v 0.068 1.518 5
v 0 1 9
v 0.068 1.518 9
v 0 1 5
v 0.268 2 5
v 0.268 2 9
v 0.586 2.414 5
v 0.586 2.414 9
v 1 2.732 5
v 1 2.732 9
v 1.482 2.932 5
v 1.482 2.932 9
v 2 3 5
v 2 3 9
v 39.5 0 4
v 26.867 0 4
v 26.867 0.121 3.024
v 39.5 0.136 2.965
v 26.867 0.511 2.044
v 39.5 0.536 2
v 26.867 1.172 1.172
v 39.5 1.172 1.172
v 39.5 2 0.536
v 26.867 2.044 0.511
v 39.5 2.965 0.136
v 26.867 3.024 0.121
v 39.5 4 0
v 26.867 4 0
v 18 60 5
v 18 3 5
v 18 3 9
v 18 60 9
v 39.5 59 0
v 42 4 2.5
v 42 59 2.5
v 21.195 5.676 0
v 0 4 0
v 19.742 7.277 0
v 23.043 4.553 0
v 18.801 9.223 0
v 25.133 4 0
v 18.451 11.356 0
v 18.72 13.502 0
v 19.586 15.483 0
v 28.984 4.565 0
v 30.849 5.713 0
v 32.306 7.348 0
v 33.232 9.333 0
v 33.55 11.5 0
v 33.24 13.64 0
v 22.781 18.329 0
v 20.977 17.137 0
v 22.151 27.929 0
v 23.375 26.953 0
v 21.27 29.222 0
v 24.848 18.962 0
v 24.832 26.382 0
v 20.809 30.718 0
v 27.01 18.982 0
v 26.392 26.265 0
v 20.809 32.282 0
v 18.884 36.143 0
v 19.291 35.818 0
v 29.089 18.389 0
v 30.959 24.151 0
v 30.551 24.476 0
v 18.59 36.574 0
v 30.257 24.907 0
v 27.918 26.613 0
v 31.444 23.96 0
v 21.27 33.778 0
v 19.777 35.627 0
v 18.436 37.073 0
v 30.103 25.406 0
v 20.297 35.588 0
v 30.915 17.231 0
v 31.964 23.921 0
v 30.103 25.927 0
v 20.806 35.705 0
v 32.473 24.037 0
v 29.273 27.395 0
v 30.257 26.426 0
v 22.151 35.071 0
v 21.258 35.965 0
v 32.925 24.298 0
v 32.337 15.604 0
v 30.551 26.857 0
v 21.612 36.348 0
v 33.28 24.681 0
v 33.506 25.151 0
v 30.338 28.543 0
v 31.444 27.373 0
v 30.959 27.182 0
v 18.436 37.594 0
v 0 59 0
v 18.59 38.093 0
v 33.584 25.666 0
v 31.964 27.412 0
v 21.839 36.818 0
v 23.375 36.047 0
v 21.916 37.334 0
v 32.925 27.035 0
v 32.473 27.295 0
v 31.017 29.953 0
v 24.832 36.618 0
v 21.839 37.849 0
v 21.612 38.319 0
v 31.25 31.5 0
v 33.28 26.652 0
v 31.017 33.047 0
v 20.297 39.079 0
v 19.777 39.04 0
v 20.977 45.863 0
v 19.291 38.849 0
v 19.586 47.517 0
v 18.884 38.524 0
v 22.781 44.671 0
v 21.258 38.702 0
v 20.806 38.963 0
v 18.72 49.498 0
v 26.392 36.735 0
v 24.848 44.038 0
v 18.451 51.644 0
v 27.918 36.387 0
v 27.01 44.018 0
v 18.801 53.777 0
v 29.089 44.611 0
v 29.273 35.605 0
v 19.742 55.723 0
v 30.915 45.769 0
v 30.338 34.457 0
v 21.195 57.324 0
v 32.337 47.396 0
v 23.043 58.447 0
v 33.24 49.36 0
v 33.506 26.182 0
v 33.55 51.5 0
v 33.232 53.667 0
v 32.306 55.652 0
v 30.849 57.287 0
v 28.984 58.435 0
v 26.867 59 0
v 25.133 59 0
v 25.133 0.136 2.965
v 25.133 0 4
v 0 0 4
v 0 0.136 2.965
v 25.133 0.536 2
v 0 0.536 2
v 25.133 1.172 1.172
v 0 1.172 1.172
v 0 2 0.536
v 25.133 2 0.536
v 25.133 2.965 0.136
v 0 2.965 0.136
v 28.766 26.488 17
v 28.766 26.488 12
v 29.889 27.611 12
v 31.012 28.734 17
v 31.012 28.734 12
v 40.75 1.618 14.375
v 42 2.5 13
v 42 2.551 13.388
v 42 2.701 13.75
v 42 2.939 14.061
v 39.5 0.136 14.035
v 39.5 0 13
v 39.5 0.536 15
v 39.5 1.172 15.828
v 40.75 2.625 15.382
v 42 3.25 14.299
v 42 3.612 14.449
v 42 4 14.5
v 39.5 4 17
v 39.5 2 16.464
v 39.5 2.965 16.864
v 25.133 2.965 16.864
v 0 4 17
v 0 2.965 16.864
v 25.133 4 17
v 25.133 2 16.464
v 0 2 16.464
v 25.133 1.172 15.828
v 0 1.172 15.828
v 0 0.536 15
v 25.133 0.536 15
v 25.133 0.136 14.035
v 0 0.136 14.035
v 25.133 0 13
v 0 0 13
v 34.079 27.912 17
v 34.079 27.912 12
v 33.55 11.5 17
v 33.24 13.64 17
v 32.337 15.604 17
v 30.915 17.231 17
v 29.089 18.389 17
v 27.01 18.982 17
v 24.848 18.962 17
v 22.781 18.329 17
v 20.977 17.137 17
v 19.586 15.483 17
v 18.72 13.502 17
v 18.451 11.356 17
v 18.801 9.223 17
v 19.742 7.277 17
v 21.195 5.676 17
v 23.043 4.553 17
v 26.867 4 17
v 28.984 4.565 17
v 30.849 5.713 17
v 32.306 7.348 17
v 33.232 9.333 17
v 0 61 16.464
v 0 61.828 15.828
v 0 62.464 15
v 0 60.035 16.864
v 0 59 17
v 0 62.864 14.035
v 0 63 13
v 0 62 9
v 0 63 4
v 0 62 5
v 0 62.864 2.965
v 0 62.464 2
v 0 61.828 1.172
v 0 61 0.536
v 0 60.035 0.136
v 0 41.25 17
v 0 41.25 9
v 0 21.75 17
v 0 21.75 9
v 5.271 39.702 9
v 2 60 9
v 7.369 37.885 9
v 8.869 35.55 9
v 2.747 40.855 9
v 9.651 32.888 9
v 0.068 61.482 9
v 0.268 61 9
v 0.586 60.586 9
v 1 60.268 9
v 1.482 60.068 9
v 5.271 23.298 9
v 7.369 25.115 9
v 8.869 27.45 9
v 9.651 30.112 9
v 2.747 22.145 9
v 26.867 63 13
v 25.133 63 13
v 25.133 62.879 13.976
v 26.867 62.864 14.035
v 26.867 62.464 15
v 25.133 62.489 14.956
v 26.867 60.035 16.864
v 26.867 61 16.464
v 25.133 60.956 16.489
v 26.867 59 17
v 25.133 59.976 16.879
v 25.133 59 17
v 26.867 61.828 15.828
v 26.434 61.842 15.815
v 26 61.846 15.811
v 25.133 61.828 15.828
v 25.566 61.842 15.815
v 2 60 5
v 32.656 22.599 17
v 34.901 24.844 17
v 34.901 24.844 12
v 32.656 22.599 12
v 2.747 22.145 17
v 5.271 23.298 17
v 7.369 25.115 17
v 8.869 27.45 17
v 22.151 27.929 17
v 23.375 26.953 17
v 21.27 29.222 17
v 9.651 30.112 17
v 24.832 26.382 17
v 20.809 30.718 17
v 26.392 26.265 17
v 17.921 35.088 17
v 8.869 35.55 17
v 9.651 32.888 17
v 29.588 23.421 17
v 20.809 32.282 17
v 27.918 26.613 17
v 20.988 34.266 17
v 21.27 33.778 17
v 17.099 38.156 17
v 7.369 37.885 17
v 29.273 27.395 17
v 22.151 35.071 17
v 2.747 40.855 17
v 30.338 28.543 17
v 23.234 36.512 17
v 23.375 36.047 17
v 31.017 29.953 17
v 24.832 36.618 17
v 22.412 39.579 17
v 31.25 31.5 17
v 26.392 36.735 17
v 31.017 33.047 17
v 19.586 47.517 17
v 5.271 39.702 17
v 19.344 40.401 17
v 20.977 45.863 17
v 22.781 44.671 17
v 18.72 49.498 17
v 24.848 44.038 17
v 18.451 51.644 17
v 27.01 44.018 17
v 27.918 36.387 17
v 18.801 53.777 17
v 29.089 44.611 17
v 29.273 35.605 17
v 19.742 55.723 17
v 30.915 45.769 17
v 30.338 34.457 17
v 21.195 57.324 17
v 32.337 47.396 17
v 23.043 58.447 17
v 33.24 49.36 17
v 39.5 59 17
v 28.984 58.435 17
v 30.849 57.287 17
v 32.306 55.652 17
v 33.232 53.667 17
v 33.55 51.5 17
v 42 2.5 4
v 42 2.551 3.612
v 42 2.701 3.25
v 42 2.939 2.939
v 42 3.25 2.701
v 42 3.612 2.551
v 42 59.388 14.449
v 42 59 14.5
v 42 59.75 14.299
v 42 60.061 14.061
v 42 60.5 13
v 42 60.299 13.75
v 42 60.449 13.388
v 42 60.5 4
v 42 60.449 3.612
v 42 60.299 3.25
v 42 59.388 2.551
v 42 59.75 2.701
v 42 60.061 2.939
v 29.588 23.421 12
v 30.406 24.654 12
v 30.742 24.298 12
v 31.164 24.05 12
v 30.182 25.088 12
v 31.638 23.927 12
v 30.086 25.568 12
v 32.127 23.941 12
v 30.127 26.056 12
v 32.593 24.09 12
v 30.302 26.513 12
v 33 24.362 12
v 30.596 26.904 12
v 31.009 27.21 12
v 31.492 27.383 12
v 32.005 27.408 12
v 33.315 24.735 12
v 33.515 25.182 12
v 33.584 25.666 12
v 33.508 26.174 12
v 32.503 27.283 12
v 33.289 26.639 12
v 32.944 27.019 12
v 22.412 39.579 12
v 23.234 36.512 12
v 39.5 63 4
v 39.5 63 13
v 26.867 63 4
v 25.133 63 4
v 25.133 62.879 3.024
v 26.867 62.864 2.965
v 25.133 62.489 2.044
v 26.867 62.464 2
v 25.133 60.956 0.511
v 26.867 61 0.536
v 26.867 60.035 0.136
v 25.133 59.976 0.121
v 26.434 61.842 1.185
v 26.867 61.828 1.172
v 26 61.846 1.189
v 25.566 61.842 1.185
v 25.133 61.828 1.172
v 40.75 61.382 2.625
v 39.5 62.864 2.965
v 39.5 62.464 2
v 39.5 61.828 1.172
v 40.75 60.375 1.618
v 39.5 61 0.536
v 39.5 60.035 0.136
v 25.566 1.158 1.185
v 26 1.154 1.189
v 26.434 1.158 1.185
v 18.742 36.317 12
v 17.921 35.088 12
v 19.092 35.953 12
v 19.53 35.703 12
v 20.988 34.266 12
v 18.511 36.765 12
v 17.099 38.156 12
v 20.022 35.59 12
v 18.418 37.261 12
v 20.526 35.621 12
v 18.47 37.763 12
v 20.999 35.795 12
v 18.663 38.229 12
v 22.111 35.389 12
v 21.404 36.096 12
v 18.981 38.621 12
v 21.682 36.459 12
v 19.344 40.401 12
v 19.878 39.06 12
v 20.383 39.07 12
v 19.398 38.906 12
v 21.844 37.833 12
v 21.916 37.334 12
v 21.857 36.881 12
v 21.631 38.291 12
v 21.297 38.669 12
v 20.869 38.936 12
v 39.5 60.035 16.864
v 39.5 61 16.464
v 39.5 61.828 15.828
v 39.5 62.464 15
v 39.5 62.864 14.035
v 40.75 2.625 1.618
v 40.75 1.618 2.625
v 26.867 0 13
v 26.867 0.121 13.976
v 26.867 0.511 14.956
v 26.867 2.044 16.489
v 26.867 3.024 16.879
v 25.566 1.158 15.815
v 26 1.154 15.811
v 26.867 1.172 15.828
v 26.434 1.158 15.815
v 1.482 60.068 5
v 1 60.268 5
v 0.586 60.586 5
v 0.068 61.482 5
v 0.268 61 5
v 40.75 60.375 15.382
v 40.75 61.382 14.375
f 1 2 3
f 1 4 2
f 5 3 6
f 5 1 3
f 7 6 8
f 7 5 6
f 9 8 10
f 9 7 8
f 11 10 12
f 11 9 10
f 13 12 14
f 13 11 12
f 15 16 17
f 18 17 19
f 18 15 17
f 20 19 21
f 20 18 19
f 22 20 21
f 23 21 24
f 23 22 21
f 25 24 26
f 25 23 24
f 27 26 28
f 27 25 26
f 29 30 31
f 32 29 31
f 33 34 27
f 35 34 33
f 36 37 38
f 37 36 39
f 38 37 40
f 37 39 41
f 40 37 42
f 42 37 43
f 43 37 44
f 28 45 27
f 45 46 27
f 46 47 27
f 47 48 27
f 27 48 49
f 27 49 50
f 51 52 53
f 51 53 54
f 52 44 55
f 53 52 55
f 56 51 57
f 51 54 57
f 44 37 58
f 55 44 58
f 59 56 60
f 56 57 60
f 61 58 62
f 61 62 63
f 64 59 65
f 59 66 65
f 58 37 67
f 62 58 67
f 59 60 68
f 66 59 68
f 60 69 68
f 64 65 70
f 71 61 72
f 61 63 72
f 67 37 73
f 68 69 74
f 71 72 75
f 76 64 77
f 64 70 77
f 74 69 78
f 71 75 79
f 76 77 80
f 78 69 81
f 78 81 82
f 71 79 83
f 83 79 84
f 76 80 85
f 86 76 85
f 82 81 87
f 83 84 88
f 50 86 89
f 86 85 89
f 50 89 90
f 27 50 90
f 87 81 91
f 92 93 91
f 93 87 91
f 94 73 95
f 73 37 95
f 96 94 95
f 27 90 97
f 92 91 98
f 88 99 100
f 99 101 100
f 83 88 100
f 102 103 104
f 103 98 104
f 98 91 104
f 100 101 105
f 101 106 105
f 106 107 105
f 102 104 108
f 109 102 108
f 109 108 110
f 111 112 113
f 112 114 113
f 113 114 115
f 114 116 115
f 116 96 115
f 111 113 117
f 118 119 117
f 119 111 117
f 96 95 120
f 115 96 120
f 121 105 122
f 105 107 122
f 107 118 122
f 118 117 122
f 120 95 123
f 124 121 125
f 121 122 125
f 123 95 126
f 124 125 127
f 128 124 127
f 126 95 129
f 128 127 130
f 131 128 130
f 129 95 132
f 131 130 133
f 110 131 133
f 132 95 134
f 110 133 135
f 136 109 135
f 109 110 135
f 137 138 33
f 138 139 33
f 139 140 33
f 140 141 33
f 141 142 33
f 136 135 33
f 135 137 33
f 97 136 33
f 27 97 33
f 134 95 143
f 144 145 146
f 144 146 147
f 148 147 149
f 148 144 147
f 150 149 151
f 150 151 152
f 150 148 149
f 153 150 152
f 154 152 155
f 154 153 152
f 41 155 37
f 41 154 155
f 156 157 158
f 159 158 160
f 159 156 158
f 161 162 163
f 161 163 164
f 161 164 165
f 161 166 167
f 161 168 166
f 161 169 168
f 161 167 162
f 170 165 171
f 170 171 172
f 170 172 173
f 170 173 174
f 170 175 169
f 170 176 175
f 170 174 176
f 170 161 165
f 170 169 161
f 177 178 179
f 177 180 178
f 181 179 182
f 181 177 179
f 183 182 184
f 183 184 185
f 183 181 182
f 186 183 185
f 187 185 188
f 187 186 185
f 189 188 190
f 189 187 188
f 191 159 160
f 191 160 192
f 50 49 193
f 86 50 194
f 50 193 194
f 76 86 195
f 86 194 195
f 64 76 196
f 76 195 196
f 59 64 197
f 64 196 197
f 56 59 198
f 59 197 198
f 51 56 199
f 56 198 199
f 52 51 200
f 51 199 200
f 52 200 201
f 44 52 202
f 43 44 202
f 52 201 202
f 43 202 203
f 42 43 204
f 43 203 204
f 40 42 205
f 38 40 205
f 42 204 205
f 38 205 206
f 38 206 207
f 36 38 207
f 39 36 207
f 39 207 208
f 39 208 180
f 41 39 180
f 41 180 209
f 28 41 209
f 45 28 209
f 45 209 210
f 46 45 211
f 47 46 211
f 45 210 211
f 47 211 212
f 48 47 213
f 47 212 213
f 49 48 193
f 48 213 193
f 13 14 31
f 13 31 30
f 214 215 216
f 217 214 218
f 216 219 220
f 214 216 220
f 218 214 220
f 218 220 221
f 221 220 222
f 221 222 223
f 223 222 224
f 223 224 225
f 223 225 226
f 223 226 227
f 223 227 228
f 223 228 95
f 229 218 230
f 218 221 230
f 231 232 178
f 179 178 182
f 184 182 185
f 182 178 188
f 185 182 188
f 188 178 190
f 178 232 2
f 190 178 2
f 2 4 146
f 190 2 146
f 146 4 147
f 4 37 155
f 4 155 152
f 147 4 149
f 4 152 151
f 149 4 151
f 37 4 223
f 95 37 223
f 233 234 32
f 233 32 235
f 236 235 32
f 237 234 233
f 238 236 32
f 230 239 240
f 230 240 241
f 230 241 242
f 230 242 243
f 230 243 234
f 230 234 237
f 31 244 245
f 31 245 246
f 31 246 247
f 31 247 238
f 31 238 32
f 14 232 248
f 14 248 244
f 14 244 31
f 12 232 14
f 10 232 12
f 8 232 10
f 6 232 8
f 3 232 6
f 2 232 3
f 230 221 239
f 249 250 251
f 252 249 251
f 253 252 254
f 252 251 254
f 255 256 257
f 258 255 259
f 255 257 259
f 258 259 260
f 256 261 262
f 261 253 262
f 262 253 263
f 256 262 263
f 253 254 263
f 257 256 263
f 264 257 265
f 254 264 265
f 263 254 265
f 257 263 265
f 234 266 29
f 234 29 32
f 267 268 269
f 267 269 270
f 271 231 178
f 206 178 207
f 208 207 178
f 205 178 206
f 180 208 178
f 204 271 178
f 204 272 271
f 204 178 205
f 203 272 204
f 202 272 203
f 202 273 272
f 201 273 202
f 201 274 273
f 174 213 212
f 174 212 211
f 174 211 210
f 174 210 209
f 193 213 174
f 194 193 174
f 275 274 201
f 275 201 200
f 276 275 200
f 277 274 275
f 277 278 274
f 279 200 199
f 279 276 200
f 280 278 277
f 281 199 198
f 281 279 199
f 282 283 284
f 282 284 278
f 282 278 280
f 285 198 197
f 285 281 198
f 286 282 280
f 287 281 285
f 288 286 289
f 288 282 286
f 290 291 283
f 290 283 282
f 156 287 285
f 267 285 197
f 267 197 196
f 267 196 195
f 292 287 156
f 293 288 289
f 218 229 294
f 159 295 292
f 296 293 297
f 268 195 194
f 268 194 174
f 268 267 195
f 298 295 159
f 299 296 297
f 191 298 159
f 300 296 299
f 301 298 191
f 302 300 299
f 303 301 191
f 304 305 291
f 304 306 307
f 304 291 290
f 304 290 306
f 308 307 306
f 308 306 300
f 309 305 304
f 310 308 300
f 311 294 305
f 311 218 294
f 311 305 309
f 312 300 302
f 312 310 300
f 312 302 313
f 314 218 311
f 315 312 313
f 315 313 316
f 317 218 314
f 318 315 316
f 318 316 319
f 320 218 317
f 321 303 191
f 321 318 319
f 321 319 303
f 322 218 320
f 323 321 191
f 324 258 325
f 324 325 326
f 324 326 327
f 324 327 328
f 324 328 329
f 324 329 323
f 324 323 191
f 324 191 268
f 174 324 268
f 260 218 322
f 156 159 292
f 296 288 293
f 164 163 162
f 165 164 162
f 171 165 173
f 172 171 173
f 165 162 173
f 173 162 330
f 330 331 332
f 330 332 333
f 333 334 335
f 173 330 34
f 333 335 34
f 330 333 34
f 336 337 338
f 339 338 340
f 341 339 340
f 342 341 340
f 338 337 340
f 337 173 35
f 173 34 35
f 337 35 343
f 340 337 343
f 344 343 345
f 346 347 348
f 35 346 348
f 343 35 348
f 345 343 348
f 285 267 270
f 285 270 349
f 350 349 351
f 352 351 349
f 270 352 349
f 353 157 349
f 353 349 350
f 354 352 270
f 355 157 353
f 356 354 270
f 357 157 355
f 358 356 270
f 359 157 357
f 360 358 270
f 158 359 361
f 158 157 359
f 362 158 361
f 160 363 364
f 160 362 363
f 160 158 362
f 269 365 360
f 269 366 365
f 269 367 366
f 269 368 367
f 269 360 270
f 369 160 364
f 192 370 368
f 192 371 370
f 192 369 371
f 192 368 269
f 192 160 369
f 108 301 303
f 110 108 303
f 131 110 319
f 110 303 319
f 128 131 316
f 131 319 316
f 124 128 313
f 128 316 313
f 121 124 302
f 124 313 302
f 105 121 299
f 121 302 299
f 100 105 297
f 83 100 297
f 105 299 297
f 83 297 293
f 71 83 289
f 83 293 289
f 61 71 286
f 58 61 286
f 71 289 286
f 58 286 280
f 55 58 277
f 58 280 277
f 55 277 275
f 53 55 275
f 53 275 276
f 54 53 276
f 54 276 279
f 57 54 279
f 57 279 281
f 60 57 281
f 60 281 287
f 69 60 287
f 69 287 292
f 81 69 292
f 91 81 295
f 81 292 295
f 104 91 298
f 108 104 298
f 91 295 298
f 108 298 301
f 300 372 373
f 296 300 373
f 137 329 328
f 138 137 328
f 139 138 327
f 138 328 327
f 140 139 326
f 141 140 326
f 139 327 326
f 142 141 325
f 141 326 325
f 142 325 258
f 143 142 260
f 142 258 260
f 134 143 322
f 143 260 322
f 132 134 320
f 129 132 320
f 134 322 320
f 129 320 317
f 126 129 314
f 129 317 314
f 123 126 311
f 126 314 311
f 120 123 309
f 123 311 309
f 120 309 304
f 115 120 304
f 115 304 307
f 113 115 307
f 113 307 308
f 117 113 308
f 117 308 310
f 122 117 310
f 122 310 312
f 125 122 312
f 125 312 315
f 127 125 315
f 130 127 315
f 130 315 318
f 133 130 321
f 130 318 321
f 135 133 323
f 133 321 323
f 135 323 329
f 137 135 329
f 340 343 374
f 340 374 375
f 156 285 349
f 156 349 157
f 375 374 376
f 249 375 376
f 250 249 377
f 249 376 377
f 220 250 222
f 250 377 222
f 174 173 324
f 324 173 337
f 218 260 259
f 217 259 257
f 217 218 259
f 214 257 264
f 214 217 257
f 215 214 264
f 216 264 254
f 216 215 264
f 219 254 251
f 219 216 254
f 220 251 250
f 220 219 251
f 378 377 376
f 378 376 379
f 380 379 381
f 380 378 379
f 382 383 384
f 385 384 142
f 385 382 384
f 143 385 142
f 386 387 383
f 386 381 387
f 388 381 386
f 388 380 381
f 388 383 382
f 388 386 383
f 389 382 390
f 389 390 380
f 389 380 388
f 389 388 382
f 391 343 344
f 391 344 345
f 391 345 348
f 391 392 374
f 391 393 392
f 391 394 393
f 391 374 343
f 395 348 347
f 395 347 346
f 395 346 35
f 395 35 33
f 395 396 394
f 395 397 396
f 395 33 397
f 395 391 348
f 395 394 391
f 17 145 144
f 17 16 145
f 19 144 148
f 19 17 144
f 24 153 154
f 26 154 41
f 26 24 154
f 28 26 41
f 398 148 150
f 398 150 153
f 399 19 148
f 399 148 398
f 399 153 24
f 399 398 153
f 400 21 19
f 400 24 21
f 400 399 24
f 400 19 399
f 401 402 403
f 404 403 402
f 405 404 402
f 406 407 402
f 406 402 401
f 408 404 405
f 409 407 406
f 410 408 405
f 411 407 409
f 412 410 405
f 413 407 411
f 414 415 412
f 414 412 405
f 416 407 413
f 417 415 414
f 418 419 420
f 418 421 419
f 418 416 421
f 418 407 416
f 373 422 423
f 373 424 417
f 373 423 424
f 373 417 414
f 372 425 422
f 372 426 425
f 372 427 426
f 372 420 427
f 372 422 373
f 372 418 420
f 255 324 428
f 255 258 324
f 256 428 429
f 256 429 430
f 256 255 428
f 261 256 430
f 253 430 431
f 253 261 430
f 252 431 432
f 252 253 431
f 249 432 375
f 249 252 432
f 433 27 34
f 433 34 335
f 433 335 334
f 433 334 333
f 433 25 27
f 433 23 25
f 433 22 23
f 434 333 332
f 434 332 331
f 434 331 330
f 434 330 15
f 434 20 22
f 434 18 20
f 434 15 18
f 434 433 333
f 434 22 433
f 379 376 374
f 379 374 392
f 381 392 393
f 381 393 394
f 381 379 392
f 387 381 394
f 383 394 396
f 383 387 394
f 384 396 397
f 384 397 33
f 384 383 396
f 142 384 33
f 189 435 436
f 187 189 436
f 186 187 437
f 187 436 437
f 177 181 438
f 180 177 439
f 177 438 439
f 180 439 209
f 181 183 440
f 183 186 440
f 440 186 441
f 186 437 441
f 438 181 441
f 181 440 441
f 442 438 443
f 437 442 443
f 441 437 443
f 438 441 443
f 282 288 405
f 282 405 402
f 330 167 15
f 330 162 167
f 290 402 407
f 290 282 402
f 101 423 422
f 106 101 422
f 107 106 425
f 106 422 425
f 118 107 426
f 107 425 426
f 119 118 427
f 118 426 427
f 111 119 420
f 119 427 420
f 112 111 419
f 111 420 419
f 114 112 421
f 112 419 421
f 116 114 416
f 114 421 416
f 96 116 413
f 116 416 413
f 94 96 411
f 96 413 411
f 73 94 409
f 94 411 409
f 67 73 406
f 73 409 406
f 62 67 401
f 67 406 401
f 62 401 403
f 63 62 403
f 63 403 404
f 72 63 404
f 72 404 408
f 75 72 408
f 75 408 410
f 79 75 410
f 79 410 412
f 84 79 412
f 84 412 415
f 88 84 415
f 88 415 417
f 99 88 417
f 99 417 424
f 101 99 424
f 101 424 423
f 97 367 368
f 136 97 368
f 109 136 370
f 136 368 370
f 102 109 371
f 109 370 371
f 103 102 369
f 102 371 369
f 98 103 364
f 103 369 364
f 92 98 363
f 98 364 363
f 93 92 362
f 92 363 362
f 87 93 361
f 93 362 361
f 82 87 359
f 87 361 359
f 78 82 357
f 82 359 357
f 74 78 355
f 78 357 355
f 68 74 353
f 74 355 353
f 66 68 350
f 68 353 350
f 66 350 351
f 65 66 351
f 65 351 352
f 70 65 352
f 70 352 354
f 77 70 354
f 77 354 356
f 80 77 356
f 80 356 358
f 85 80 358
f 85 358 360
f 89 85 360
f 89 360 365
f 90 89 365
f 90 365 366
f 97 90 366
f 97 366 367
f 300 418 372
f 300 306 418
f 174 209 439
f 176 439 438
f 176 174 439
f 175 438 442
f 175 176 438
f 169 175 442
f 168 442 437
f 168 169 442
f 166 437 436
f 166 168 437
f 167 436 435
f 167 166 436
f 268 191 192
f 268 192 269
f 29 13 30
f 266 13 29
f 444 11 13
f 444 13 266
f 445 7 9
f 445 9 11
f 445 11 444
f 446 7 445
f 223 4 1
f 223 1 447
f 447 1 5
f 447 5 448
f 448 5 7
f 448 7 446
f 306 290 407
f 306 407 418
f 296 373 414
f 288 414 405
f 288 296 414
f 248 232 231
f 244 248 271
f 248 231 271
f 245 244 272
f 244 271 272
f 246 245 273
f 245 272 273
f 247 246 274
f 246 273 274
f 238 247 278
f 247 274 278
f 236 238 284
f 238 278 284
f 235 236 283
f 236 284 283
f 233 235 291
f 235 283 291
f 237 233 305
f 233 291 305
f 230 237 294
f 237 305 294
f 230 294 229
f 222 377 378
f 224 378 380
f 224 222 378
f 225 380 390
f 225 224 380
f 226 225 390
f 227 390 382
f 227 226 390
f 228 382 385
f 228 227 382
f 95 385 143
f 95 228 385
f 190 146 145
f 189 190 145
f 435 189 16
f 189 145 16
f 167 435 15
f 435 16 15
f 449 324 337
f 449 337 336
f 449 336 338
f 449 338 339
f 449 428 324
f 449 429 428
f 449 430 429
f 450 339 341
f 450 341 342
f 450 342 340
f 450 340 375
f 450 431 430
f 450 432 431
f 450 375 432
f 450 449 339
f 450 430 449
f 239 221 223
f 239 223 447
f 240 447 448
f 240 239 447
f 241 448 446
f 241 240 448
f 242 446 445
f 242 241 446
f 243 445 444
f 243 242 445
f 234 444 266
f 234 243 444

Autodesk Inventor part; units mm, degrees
ref_plane "YZ Plane" through (0, 0, 0) normal (1, 0, 0) x (0, 1, 0)
ref_plane "XZ Plane" through (0, 0, 0) normal (0, 1, 0) x (-1, 0, 0)
sketch "Sketch1" plane through (0, 0, 0) normal (0, 0, 1) x (1, 0, 0)
  line L0 (0, 0) -> (42, 0)
  line L1 (42, 0) -> (42, 63)
  line L2 (42, 63) -> (0, 63)
  line L3 (0, 63) -> (0, 0)
  dimension "d0" = 42
  dimension "d1" = 63
extrude "Extrusion1" add sketch "Sketch1" along normal blind 17
sketch "Sketch2" plane through (0, 0, 17) normal (0, 0, 1) x (1, 0, 0)
  line L0 (0, 63) -> (0, 0) projected
  line L1 (0, 31.5) -> (26, 31.5)
  circle A0 centre (26, 31.5) radius 5.25
  dimension "d4" = 26
  dimension "d5" = 10.5
extrude "Extrusion2" cut sketch "Sketch2" against normal blind 17
sketch "Sketch4" plane through (0, 0, 17) normal (0, 0, 1) x (1, 0, 0)
  circle A0 centre (26, 31.5) radius 5.25 projected
  line L0 (26, 31.5) -> (26, 51.5)
  line L1 (26, 31.5) -> (26, 11.5)
  circle A1 centre (26, 51.5) radius 7.55
  circle A2 centre (26, 11.5) radius 7.55
  point P0 (0, 0)
  dimension "d14" = 20
  dimension "d15" = 20
  dimension "d16" = 15.1
  dimension "d17" = 15.1
extrude "Extrusion4" cut sketch "Sketch4" against normal blind 17 contours A2 | A1
sketch "Sketch5" plane through (0, 0, 17) normal (0, 0, 1) x (1, 0, 0)
  line L0 (0, 63) -> (0, 0) projected
  line L1 (0, 31.5) -> (10, 31.5)
  circle A0 centre (26, 31.5) radius 5.25 projected
  line L2 (26, 31.5) -> (20.1664, 37.3336)
  line L3 (26, 31.5) -> (34.25, 31.5) construction
  line L4 (20.1664, 37.3336) -> (31.8336, 25.6664)
  circle A1 centre (31.8336, 25.6664) radius 1.75
  circle A2 centre (20.1664, 37.3336) radius 1.75
  dimension "d21" = 10
  dimension "d22" = 8.25
  dimension "d23" = 135
  dimension "d24" = 16.5
  dimension "d25" = 3.5
  dimension "d26" = 3.5
extrude "Extrusion5" cut sketch "Sketch5" against normal blind 17 contours A1 | A2
ref_plane "Work Plane1" through (0, 0, 7.5) normal (0, 0, 1) x (1, 0, 0)
sketch "Sketch8" plane through (0, 0, 17) normal (0, 0, 1) x (1, 0, 0)
  line L0 (0, 63) -> (0, 0) projected
  circle A0 centre (0, 31.5) radius 9.75
  dimension "d36" = 19.5
extrude "Extrusion8" cut sketch "Sketch8" against normal blind 10
sketch "Sketch9" plane through (0, 0, 7) normal (0, 0, 1) x (1, 0, 0)
  arc A0 (0, 21.75) -> (0, 41.25) centre (0, 31.5) ccw projected
  circle A1 centre (0, 31.5) radius 12.5
  point P0 (0, 0)
  dimension "d39" = 25
extrude "Extrusion9" [suppressed]
sketch "Sketch10" plane through (0, 0, 0) normal (-1, 0, 0) x (0, 0, 1)
  circle A0 centre (5, 6) radius 1.6
  line L0 (0, 26.25) -> (0, 36.75) projected
  line L1 (0, 31.5) -> (15.0441, 31.5)
  circle A1 centre (5, 57) radius 1.6
  point P0 (0, 0)
  dimension "d42" = 3.2
extrude "Extrusion10" [suppressed]
ref_plane "Work Plane2" through (3, 0, 0) normal (-1, 0, 0) x (0, 0, 1)
sketch "Sketch11" plane through (3, 0, 0) normal (-1, 0, 0) x (0, 0, 1)
  circle A0 centre (5, 6) radius 1.6 projected
  line L0 (5, 6) -> (5, 8.75)
  line L1 (6.5877, 8.75) -> (8.1754, 6)
  line L2 (8.1754, 6) -> (6.5877, 3.25)
  line L3 (6.5877, 3.25) -> (3.4123, 3.25)
  line L4 (3.4123, 3.25) -> (1.8246, 6)
  line L5 (1.8246, 6) -> (3.4123, 8.75)
  line L6 (3.4123, 8.75) -> (6.5877, 8.75)
  circle A1 centre (5, 57) radius 1.6 projected
  line L7 (5, 57) -> (5, 54.25)
  line L8 (3.4123, 54.25) -> (1.8246, 57)
  line L9 (1.8246, 57) -> (3.4123, 59.75)
  line L10 (3.4123, 59.75) -> (6.5877, 59.75)
  line L11 (6.5877, 59.75) -> (8.1754, 57)
  line L12 (8.1754, 57) -> (6.5877, 54.25)
  line L13 (6.5877, 54.25) -> (3.4123, 54.25)
  point P0 (0, 0)
  dimension "d46" = 2.75
  dimension "d47" = 2.75
extrude "Extrusion11" [suppressed]
sketch "Sketch12" plane through (0, 0, 0) normal (0, 0, -1) x (-1, 0, 0)
  line L0 (-3, 3.25) -> (-5.5, 3.25) projected
  line L1 (-3, 3.25) -> (-5.5, 3.25)
  line L2 (-5.5, 3.25) -> (-5.5, 8.75)
  line L3 (-5.5, 8.75) -> (-3, 8.75)
  line L4 (-3, 8.75) -> (-3, 3.25)
  line L5 (-3, 43.25) -> (-5.5, 43.25) projected
  line L6 (-5.5, 48.75) -> (-5.5, 46) projected
  line L7 (-3, 43.25) -> (-5.5, 43.25)
  line L8 (-5.5, 43.25) -> (-5.5, 48.75)
  line L9 (-5.5, 48.75) -> (-3, 48.75)
  line L10 (-3, 48.75) -> (-3, 43.25)
  point P0 (0, 0)
extrude "Extrusion12" [suppressed]
sketch "Sketch13" plane through (0, 0, 0) normal (-1, 0, 0) x (0, 0, 1)
  line L0 (5, 60) -> (9, 60)
  line L1 (9, 60) -> (9, 3)
  line L2 (9, 3) -> (5, 3)
  line L3 (5, 3) -> (5, 60)
  point P0 (0, 0)
  point P1 (5, 31.5)
  dimension "d83" = 4
extrude "Extrusion13" cut sketch "Sketch13" against normal blind 18
fillet "Fillet1" radius 2 2 edges at (0, 3, 7) (0, 60, 7)
sketch "Sketch14" plane through (0, 0, 0) normal (-1, 0, 0) x (0, 0, 1)
  point P0 (0, 0)
sketch "Sketch15" plane through (0, 0, 0) normal (0, 0, -1) x (-1, 0, 0)
  line L0 (0, 21.75) -> (0, 41.25) projected
  line L1 (0, 61.05) -> (0, 53.05)
  line L2 (0, 53.05) -> (-5, 53.05)
  circle A0 centre (-5, 53.05) radius 1.6
  line L3 (0, 0) -> (-42, 0) projected
  line L4 (0, 0) -> (0, 8)
  line L5 (-2, 11.95) -> (-10, 11.95) projected
  line L6 (0, 8) -> (-5, 8)
  circle A1 centre (-5, 8) radius 1.6
  point P0 (0, 9.95)
  dimension "d59" = 8
  dimension "d60" = 5
  dimension "d61" = 3.2
  dimension "d71" = 8
  dimension "d72" = 5
  dimension "d73" = 3.2
extrude "Extrusion14" [suppressed]
sketch "Sketch17" plane through (0, 0, 17) normal (0, 0, 1) x (1, 0, 0)
  circle A0 centre (5, 53.05) radius 1.6 projected
  line L0 (5, 53.05) -> (5, 50.3)
  line L1 (3.4123, 50.3) -> (1.8246, 53.05)
  line L2 (1.8246, 53.05) -> (3.4123, 55.8)
  line L3 (3.4123, 55.8) -> (6.5877, 55.8)
  line L4 (6.5877, 55.8) -> (8.1754, 53.05)
  line L5 (8.1754, 53.05) -> (6.5877, 50.3)
  line L6 (6.5877, 50.3) -> (3.4123, 50.3)
  circle A1 centre (5, 8) radius 1.6 projected
  line L7 (5, 8) -> (5, 10.75)
  line L8 (6.5877, 10.75) -> (8.1754, 8)
  line L9 (8.1754, 8) -> (6.5877, 5.25)
  line L10 (6.5877, 5.25) -> (3.4123, 5.25)
  line L11 (3.4123, 5.25) -> (1.8246, 8)
  line L12 (1.8246, 8) -> (3.4123, 10.75)
  line L13 (3.4123, 10.75) -> (6.5877, 10.75)
  point P0 (0, 0)
  dimension "d68" = 2.75
  dimension "d76" = 2.75
extrude "Extrusion15" [suppressed]
sketch "Sketch19" plane through (0, 0, 0) normal (-1, 0, 0) x (0, 0, 1)
  point P0 (0, 0)
sketch "Sketch20" plane through (0, 0, 0) normal (-1, 0, 0) x (0, 0, 1)
  point P0 (0, 0)
fillet "Fillet2" radius 4 4 edges at (21, 0, 0) (21, 63, 0) (21, 63, 17) (21, 0, 17)
sketch "Sketch21" plane through (0, 0, 17) normal (0, 0, 1) x (1, 0, 0)
  circle A0 centre (31.8336, 25.6664) radius 1.75 projected
  line L0 (31.8336, 25.6664) -> (29.8891, 27.6109)
  line L1 (31.8336, 25.6664) -> (34.5836, 25.6664) construction
  circle A1 centre (20.1664, 37.3336) radius 1.75 projected
  line L2 (20.1664, 37.3336) -> (22.1109, 35.3891)
  line L3 (20.9882, 34.2664) -> (17.921, 35.0883)
  line L4 (17.921, 35.0883) -> (17.0991, 38.1555)
  line L5 (17.0991, 38.1555) -> (19.3445, 40.4009)
  line L6 (19.3445, 40.4009) -> (22.4117, 39.579)
  line L7 (22.4117, 39.579) -> (23.2336, 36.5118)
  line L8 (23.2336, 36.5118) -> (20.9882, 34.2664)
  line L9 (31.0118, 28.7336) -> (34.079, 27.9117)
  line L10 (34.079, 27.9117) -> (34.9009, 24.8445)
  line L11 (34.9009, 24.8445) -> (32.6555, 22.5991)
  line L12 (32.6555, 22.5991) -> (29.5883, 23.421)
  line L13 (29.5883, 23.421) -> (28.7664, 26.4882)
  line L14 (28.7664, 26.4882) -> (31.0118, 28.7336)
  point P0 (0, 0)
  dimension "d78" = 2.75
  dimension "d79" = 135
  dimension "d80" = 2.75
extrude "Extrusion16" cut sketch "Sketch21" against normal blind 5
chamfer "Chamfer1" distance 2.5 angle 45 8 edges at (42, 31.5, 17) (42, 61.8284, 15.8284) (42, 63, 8.5) (42, 61.8284, 1.1716) (42, 31.5, 0) (42, 1.1716, 1.1716) (42, 0, 8.5) (42, 1.1716, 15.8284)
properties part number "syringe_pump_sledge"
